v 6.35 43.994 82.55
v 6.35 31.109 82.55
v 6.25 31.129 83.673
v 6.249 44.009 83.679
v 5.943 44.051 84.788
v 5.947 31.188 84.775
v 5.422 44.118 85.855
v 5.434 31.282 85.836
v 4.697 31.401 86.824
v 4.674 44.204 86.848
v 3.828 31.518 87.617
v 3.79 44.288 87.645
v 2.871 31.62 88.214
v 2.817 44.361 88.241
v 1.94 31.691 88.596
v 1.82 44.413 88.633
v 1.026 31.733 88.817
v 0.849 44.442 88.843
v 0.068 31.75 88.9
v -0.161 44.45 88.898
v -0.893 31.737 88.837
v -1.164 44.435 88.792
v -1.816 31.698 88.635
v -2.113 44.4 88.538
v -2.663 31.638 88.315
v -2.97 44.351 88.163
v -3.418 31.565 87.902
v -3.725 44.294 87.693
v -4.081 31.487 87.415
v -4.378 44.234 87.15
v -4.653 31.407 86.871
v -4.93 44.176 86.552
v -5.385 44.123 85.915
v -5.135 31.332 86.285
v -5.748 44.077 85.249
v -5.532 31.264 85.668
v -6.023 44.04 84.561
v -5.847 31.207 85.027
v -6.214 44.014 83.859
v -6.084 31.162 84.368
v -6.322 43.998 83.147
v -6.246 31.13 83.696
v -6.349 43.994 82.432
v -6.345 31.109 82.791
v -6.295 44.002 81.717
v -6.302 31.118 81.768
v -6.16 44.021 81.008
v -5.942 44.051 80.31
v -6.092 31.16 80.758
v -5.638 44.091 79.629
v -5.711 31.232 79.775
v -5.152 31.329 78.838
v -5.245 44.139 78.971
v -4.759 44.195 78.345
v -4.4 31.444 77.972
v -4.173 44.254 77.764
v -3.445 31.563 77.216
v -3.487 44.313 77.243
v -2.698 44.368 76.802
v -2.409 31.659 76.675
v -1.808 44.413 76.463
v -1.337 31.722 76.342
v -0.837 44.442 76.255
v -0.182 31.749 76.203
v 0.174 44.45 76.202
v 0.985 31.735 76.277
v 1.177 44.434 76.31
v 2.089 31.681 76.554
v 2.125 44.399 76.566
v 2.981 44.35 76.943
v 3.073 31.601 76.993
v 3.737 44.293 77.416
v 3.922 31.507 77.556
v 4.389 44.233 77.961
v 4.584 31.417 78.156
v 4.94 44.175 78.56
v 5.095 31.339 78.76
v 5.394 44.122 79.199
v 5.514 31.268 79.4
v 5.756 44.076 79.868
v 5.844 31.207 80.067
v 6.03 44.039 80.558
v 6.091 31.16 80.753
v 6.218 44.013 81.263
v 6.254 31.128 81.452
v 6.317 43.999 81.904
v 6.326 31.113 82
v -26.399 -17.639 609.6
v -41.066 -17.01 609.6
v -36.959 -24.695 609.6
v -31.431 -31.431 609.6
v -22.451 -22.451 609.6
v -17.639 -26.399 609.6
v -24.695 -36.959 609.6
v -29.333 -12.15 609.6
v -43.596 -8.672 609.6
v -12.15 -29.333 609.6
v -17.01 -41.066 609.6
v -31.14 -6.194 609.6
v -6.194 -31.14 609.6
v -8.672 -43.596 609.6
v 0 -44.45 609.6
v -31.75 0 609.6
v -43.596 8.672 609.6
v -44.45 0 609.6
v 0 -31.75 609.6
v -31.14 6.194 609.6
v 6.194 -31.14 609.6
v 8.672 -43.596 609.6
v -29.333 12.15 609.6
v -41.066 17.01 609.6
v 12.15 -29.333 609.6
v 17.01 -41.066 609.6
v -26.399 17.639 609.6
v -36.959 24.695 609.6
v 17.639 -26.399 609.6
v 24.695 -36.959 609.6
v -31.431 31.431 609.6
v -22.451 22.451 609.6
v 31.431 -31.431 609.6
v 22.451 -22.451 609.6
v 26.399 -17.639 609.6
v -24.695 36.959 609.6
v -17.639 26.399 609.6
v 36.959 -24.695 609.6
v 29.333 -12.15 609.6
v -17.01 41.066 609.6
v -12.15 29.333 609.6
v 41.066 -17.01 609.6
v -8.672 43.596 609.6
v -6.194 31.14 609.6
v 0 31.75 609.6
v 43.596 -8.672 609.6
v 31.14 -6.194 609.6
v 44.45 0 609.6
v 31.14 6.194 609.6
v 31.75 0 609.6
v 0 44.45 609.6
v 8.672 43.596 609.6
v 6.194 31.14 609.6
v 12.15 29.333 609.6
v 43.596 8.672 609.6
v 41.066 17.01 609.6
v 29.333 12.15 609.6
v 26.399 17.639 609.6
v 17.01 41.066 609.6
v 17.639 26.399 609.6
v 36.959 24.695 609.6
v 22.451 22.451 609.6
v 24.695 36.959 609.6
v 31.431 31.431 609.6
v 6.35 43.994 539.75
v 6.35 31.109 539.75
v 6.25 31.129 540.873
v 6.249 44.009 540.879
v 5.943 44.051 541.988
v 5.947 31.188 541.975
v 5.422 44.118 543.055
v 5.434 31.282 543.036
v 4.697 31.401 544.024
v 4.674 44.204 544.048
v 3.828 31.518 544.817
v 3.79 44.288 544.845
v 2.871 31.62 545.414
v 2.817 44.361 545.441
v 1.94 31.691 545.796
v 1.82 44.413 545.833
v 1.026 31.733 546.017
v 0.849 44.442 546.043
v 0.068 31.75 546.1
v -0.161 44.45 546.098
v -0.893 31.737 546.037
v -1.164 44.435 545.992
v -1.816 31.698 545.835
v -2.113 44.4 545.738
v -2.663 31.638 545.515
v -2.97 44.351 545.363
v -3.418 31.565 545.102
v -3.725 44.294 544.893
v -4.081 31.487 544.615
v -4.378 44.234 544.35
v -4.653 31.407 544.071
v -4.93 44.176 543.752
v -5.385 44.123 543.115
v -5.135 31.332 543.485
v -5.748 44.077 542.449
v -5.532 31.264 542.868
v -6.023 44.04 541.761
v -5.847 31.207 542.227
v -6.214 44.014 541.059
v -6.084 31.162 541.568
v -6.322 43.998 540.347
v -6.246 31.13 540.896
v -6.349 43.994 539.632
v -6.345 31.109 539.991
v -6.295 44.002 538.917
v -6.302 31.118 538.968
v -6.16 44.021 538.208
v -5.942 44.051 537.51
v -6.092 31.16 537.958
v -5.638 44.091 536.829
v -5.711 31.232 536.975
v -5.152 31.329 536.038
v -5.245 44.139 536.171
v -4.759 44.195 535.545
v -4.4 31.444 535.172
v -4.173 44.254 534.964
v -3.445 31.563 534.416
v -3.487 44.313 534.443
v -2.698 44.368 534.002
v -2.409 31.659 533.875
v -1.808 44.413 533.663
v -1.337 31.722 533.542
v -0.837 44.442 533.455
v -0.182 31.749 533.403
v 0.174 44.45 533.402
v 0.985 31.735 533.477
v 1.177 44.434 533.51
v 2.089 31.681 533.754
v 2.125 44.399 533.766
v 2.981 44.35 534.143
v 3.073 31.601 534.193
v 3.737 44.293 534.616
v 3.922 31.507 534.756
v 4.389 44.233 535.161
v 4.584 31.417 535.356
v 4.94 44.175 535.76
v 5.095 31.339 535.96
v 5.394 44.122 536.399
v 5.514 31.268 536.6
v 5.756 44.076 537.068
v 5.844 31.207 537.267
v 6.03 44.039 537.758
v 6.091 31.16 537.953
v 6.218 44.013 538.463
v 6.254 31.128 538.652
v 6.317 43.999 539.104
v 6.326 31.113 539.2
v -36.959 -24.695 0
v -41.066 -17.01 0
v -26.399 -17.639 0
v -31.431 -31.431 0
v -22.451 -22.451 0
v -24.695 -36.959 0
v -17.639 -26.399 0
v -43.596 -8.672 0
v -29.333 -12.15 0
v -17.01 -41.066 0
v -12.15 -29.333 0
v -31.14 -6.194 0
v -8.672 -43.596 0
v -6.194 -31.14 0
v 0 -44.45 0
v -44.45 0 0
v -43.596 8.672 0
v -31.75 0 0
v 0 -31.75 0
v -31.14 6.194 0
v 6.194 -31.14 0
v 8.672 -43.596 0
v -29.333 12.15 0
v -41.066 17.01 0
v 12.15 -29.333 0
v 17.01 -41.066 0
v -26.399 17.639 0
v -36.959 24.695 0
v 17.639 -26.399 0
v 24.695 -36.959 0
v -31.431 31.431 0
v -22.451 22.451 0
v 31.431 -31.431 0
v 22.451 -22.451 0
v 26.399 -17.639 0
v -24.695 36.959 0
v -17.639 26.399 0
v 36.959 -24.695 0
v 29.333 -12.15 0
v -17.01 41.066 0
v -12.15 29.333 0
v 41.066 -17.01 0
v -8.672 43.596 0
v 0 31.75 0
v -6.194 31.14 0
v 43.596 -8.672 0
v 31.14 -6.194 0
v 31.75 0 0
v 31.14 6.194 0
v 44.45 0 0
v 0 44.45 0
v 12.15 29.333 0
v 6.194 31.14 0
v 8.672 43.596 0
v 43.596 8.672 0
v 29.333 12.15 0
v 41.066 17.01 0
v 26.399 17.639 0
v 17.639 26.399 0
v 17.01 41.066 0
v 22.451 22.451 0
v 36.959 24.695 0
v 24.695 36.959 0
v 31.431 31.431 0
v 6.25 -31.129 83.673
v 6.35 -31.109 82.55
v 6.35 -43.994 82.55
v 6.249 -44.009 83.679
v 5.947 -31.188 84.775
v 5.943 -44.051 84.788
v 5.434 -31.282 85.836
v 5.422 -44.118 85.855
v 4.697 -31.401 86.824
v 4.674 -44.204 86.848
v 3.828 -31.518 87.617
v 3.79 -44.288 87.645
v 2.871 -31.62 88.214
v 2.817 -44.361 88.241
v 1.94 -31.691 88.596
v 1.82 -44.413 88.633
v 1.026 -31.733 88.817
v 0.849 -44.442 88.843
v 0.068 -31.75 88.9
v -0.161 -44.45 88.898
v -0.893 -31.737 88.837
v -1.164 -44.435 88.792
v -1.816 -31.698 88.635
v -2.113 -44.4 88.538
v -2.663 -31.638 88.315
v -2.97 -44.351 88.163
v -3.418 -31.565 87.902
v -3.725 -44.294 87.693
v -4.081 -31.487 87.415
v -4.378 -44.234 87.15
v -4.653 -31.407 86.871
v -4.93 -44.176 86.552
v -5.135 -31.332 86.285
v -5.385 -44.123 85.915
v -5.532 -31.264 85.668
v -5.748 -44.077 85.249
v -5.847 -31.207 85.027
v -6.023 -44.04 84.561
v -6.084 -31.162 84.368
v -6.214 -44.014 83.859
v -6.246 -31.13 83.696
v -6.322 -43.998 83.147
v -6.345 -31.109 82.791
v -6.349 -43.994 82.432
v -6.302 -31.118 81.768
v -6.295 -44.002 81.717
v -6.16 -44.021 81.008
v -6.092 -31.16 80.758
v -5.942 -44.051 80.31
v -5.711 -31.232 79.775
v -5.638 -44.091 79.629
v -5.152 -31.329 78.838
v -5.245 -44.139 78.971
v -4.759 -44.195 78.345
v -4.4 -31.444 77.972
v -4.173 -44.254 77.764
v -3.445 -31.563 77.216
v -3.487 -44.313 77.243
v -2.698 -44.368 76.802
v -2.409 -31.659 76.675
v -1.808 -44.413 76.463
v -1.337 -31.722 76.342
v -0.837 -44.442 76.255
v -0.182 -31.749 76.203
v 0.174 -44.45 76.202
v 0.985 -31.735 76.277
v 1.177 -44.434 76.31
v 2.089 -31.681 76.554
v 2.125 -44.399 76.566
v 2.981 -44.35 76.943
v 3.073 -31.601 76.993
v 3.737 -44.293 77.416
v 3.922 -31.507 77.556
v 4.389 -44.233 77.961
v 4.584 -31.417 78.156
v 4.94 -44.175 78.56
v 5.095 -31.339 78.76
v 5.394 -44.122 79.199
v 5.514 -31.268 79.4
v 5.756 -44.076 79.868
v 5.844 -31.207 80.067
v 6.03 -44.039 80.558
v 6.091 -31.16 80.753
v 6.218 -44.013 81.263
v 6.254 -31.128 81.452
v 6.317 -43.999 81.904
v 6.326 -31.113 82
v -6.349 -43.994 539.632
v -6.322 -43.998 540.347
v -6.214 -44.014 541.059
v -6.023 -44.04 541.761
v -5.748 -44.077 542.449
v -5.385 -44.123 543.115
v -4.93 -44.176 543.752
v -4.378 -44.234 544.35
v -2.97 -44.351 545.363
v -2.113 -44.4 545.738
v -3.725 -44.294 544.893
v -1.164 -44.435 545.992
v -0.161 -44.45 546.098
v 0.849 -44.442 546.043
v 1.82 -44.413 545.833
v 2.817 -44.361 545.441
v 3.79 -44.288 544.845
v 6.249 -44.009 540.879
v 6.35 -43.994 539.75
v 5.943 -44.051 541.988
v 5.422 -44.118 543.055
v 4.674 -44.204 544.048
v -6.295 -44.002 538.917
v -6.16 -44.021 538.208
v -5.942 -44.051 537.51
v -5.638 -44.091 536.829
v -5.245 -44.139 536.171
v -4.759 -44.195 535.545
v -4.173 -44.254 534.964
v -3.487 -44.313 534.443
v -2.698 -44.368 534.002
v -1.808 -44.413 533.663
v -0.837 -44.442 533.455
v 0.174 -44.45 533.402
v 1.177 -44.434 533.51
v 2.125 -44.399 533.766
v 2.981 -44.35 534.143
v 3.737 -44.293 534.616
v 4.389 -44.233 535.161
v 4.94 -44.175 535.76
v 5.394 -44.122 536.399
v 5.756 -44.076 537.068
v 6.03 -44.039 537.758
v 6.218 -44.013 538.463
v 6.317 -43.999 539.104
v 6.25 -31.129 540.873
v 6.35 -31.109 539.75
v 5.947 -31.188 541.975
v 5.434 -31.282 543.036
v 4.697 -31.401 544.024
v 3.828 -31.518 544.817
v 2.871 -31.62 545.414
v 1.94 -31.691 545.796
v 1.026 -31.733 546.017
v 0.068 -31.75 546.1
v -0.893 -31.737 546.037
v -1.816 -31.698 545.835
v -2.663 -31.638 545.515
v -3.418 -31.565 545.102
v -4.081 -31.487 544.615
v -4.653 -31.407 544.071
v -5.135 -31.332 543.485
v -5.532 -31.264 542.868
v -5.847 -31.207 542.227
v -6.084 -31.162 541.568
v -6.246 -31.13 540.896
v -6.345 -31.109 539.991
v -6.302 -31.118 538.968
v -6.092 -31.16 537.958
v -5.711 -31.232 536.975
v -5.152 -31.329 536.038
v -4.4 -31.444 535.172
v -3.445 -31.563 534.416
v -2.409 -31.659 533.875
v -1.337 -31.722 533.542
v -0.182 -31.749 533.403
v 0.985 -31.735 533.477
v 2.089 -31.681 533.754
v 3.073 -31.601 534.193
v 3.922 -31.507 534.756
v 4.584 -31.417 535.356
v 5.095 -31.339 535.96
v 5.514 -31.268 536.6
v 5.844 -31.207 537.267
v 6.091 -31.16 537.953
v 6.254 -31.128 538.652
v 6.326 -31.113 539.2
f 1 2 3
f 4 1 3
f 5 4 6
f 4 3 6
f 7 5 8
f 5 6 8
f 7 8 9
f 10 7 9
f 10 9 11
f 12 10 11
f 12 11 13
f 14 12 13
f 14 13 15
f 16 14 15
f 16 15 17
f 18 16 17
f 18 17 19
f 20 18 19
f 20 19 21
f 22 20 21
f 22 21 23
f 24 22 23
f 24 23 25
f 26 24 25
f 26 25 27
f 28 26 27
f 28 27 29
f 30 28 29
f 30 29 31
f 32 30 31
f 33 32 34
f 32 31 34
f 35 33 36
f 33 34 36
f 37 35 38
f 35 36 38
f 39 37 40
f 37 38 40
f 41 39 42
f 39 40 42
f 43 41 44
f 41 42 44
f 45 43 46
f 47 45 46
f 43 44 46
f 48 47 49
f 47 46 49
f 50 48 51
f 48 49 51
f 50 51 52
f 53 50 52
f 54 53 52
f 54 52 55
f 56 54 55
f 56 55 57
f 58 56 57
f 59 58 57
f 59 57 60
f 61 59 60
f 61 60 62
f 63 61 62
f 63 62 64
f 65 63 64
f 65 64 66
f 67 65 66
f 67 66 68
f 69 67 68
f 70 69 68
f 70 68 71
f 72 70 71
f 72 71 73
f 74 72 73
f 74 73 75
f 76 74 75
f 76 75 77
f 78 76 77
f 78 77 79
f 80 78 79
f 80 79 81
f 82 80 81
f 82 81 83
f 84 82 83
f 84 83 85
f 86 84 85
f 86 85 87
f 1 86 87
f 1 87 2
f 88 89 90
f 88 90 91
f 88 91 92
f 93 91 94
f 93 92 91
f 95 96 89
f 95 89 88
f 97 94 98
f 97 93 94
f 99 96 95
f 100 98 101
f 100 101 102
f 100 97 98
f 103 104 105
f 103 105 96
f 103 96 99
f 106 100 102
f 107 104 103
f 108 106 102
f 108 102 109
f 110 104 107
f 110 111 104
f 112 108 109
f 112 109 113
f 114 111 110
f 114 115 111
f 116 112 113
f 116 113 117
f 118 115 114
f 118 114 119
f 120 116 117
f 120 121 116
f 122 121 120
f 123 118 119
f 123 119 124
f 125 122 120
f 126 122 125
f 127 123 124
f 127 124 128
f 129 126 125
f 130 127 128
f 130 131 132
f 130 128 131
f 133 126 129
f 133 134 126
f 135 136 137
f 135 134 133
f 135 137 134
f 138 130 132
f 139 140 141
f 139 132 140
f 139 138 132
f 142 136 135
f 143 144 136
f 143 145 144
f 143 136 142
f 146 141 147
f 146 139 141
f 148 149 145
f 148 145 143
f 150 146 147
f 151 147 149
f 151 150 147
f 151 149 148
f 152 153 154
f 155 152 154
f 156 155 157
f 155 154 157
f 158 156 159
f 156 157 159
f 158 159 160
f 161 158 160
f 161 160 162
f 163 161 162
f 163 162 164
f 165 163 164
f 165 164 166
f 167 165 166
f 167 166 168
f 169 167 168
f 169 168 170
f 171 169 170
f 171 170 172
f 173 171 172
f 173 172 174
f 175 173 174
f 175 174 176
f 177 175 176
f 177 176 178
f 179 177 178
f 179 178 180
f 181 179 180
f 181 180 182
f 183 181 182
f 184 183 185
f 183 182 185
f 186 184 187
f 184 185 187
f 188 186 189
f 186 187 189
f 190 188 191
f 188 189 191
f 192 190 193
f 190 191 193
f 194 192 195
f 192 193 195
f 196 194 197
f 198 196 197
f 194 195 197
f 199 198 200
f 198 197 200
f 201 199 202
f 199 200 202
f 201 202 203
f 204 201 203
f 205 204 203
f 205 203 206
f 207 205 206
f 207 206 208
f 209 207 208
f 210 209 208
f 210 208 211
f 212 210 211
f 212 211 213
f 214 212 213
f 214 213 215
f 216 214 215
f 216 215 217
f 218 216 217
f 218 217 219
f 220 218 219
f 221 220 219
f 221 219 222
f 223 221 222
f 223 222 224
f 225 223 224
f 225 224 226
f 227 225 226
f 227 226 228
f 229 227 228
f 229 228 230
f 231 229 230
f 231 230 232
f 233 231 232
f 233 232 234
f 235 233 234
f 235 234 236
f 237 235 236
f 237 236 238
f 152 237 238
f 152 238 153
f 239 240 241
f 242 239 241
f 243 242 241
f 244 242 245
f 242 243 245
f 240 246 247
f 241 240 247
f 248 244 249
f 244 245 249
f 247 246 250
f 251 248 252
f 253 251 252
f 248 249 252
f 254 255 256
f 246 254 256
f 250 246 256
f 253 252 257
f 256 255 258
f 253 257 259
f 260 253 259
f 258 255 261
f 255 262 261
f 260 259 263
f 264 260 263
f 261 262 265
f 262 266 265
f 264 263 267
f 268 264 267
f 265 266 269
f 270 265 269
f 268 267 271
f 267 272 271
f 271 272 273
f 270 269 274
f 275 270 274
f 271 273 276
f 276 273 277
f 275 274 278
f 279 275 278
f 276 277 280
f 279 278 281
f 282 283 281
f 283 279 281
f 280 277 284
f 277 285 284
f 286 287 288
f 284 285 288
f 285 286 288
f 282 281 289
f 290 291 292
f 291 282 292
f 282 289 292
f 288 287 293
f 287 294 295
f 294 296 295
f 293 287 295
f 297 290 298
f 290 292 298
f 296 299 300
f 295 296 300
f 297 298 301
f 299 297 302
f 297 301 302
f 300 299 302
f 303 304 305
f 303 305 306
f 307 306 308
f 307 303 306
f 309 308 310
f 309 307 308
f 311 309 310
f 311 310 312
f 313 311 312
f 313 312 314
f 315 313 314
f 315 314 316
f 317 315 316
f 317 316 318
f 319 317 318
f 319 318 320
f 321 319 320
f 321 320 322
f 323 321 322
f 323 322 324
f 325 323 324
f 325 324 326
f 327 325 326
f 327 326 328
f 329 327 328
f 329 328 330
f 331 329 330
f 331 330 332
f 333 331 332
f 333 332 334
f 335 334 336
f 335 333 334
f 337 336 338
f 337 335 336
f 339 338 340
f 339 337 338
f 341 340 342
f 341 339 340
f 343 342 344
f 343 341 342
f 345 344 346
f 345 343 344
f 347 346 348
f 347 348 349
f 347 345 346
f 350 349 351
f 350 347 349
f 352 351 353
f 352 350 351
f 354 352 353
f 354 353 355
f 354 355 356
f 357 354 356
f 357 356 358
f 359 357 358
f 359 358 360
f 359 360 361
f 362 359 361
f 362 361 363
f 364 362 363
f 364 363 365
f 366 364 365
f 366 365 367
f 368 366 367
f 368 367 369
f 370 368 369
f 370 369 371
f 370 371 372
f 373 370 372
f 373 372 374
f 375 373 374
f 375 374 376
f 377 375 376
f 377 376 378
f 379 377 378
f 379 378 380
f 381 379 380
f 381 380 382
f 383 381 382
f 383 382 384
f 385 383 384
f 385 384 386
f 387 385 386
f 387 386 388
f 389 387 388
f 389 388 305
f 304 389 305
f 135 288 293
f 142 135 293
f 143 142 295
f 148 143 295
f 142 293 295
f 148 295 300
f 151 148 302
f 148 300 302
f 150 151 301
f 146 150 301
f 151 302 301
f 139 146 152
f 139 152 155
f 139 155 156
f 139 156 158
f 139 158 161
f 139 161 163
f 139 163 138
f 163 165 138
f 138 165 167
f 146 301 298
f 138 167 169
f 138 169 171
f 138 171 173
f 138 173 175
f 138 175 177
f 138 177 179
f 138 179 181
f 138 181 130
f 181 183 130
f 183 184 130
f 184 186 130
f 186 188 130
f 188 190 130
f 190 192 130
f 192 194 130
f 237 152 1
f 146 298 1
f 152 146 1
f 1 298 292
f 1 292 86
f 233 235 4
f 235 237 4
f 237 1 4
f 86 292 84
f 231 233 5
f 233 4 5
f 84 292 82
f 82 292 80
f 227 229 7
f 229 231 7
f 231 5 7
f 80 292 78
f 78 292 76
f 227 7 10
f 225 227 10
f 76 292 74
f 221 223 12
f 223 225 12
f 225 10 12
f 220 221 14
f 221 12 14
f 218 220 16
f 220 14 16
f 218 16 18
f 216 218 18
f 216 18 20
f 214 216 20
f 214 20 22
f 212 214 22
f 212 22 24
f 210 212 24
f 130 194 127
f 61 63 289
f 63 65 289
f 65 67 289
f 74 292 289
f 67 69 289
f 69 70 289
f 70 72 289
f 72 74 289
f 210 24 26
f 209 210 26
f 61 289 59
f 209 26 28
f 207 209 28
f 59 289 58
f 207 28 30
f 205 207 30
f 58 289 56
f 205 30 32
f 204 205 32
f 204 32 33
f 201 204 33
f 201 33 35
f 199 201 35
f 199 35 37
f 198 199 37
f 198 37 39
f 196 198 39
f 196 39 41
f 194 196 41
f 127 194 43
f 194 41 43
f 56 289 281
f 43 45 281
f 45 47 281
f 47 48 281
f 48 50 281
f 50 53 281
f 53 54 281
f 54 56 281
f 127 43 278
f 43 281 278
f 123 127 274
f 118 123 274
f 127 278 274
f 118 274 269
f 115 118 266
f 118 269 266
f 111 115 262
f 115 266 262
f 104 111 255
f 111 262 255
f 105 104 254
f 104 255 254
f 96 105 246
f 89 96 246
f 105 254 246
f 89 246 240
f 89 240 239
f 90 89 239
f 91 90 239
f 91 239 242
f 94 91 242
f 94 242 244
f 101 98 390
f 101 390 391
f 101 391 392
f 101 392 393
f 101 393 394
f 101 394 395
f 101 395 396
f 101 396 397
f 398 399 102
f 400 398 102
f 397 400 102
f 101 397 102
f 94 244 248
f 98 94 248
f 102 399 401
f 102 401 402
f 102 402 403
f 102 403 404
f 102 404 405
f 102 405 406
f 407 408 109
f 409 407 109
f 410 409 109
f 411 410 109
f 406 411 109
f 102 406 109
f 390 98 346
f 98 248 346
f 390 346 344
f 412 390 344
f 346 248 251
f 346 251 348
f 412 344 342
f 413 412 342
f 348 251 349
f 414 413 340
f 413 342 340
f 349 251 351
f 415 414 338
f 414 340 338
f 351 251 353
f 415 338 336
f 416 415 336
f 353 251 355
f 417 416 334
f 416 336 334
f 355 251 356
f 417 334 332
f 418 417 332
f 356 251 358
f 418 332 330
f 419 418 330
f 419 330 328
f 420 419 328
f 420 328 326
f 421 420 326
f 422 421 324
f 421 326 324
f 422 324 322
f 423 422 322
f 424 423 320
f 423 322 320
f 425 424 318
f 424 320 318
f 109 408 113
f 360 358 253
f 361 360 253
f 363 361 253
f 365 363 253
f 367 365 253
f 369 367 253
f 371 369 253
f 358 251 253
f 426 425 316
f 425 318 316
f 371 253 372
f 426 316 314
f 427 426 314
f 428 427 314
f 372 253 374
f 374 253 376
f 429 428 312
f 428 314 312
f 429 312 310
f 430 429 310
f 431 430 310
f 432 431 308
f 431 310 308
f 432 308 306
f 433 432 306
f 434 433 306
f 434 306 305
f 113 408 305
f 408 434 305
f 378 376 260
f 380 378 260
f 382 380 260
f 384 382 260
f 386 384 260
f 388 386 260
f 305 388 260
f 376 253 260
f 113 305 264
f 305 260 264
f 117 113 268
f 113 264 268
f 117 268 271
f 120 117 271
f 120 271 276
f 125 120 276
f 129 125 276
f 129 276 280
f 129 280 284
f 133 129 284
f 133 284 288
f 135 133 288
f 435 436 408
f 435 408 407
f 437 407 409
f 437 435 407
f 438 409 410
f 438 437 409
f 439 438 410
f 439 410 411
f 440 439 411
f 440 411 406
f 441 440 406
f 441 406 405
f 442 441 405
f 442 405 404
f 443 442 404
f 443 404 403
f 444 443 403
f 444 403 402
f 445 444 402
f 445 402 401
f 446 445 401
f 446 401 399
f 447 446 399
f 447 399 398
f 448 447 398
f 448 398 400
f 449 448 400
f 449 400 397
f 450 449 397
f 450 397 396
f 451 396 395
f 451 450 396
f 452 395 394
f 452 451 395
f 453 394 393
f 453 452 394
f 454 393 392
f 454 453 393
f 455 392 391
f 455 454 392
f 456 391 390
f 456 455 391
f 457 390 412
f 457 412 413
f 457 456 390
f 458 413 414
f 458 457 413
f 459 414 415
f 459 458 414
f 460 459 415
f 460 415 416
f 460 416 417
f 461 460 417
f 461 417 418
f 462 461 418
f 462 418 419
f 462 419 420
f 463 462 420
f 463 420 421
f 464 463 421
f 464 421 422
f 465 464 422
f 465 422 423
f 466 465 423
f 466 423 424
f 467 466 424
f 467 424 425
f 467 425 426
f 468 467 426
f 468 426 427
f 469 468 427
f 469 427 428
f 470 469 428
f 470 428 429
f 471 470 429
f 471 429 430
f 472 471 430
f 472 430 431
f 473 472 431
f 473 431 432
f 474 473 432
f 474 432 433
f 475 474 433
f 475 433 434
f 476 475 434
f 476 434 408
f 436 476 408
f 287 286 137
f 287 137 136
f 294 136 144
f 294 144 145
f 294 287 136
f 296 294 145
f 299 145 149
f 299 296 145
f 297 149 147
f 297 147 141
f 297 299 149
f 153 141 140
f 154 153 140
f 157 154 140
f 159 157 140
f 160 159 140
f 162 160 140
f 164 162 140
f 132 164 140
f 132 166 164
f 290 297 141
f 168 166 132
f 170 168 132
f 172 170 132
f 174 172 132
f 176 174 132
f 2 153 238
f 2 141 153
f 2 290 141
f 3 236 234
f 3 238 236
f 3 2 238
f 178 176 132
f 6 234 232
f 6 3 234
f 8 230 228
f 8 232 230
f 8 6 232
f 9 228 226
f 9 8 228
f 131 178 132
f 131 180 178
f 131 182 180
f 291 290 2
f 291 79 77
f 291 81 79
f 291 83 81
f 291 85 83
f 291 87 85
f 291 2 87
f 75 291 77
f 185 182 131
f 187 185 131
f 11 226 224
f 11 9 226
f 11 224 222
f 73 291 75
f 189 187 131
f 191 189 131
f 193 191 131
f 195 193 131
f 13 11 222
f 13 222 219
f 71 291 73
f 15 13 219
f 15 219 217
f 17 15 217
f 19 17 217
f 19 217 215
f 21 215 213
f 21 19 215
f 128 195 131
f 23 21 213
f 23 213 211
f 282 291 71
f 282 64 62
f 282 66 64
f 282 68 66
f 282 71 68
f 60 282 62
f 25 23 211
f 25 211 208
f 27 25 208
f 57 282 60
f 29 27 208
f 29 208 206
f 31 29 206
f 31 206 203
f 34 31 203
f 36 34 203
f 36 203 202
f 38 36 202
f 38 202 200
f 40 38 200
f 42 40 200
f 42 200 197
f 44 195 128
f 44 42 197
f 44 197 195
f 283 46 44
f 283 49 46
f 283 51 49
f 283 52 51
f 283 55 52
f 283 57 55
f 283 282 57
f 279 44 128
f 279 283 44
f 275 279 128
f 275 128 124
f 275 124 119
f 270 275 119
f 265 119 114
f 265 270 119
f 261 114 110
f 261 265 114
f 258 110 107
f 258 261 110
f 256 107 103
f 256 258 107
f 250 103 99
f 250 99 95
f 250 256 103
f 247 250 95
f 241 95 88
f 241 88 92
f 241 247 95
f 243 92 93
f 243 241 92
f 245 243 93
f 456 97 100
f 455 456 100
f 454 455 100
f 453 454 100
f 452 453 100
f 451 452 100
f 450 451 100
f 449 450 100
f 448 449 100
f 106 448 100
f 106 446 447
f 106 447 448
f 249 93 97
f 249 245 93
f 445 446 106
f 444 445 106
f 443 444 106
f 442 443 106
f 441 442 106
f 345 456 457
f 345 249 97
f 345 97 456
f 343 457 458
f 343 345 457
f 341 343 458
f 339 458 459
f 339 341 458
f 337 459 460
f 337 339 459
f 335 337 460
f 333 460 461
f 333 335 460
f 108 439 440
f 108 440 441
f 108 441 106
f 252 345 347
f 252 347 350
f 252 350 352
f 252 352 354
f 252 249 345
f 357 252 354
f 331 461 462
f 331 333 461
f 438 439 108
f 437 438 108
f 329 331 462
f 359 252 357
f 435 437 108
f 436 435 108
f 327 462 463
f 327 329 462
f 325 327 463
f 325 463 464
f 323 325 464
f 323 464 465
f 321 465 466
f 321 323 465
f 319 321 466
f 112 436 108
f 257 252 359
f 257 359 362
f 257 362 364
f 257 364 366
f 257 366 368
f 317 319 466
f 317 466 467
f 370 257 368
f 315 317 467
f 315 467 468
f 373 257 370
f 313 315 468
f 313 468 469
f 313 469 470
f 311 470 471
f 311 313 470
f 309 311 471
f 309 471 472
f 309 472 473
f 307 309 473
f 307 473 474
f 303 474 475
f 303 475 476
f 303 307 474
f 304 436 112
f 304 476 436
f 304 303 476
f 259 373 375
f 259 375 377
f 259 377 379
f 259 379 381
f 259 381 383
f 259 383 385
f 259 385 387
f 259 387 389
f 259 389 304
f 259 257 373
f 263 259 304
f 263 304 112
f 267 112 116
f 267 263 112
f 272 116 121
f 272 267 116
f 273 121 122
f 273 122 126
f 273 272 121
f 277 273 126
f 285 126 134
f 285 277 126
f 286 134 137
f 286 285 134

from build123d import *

# Parameters (mm, degrees)
F0_R     = 44.45
F0_R_2   = 31.75
F1_DEPTH = 609.6
F2_R     = 6.35
F3_DEPTH = 44.451
F4_DEPTH = 44.451


with BuildPart() as f1:
    # F0 (on Top) → F1 (new body)
    with BuildSketch(Plane.XY):
        Circle(F0_R)
        Circle(F0_R_2, mode=Mode.SUBTRACT)
    extrude(amount=F1_DEPTH)

    # F2 (on Front) → F3 (cut, through all)
    with BuildSketch(Plane.XZ):
        with Locations((0, 539.75)):
            Circle(F2_R)
        with Locations((0, 82.55)):
            Circle(F2_R)
    extrude(amount=F3_DEPTH, mode=Mode.SUBTRACT)

    # F2 (on Front) → F4 (cut, through all)
    with BuildSketch(Plane.XZ):
        with Locations((0, 539.75)):
            Circle(F2_R)
        with Locations((0, 82.55)):
            Circle(F2_R)
    extrude(amount=-F4_DEPTH, mode=Mode.SUBTRACT)


solid = f1.part
